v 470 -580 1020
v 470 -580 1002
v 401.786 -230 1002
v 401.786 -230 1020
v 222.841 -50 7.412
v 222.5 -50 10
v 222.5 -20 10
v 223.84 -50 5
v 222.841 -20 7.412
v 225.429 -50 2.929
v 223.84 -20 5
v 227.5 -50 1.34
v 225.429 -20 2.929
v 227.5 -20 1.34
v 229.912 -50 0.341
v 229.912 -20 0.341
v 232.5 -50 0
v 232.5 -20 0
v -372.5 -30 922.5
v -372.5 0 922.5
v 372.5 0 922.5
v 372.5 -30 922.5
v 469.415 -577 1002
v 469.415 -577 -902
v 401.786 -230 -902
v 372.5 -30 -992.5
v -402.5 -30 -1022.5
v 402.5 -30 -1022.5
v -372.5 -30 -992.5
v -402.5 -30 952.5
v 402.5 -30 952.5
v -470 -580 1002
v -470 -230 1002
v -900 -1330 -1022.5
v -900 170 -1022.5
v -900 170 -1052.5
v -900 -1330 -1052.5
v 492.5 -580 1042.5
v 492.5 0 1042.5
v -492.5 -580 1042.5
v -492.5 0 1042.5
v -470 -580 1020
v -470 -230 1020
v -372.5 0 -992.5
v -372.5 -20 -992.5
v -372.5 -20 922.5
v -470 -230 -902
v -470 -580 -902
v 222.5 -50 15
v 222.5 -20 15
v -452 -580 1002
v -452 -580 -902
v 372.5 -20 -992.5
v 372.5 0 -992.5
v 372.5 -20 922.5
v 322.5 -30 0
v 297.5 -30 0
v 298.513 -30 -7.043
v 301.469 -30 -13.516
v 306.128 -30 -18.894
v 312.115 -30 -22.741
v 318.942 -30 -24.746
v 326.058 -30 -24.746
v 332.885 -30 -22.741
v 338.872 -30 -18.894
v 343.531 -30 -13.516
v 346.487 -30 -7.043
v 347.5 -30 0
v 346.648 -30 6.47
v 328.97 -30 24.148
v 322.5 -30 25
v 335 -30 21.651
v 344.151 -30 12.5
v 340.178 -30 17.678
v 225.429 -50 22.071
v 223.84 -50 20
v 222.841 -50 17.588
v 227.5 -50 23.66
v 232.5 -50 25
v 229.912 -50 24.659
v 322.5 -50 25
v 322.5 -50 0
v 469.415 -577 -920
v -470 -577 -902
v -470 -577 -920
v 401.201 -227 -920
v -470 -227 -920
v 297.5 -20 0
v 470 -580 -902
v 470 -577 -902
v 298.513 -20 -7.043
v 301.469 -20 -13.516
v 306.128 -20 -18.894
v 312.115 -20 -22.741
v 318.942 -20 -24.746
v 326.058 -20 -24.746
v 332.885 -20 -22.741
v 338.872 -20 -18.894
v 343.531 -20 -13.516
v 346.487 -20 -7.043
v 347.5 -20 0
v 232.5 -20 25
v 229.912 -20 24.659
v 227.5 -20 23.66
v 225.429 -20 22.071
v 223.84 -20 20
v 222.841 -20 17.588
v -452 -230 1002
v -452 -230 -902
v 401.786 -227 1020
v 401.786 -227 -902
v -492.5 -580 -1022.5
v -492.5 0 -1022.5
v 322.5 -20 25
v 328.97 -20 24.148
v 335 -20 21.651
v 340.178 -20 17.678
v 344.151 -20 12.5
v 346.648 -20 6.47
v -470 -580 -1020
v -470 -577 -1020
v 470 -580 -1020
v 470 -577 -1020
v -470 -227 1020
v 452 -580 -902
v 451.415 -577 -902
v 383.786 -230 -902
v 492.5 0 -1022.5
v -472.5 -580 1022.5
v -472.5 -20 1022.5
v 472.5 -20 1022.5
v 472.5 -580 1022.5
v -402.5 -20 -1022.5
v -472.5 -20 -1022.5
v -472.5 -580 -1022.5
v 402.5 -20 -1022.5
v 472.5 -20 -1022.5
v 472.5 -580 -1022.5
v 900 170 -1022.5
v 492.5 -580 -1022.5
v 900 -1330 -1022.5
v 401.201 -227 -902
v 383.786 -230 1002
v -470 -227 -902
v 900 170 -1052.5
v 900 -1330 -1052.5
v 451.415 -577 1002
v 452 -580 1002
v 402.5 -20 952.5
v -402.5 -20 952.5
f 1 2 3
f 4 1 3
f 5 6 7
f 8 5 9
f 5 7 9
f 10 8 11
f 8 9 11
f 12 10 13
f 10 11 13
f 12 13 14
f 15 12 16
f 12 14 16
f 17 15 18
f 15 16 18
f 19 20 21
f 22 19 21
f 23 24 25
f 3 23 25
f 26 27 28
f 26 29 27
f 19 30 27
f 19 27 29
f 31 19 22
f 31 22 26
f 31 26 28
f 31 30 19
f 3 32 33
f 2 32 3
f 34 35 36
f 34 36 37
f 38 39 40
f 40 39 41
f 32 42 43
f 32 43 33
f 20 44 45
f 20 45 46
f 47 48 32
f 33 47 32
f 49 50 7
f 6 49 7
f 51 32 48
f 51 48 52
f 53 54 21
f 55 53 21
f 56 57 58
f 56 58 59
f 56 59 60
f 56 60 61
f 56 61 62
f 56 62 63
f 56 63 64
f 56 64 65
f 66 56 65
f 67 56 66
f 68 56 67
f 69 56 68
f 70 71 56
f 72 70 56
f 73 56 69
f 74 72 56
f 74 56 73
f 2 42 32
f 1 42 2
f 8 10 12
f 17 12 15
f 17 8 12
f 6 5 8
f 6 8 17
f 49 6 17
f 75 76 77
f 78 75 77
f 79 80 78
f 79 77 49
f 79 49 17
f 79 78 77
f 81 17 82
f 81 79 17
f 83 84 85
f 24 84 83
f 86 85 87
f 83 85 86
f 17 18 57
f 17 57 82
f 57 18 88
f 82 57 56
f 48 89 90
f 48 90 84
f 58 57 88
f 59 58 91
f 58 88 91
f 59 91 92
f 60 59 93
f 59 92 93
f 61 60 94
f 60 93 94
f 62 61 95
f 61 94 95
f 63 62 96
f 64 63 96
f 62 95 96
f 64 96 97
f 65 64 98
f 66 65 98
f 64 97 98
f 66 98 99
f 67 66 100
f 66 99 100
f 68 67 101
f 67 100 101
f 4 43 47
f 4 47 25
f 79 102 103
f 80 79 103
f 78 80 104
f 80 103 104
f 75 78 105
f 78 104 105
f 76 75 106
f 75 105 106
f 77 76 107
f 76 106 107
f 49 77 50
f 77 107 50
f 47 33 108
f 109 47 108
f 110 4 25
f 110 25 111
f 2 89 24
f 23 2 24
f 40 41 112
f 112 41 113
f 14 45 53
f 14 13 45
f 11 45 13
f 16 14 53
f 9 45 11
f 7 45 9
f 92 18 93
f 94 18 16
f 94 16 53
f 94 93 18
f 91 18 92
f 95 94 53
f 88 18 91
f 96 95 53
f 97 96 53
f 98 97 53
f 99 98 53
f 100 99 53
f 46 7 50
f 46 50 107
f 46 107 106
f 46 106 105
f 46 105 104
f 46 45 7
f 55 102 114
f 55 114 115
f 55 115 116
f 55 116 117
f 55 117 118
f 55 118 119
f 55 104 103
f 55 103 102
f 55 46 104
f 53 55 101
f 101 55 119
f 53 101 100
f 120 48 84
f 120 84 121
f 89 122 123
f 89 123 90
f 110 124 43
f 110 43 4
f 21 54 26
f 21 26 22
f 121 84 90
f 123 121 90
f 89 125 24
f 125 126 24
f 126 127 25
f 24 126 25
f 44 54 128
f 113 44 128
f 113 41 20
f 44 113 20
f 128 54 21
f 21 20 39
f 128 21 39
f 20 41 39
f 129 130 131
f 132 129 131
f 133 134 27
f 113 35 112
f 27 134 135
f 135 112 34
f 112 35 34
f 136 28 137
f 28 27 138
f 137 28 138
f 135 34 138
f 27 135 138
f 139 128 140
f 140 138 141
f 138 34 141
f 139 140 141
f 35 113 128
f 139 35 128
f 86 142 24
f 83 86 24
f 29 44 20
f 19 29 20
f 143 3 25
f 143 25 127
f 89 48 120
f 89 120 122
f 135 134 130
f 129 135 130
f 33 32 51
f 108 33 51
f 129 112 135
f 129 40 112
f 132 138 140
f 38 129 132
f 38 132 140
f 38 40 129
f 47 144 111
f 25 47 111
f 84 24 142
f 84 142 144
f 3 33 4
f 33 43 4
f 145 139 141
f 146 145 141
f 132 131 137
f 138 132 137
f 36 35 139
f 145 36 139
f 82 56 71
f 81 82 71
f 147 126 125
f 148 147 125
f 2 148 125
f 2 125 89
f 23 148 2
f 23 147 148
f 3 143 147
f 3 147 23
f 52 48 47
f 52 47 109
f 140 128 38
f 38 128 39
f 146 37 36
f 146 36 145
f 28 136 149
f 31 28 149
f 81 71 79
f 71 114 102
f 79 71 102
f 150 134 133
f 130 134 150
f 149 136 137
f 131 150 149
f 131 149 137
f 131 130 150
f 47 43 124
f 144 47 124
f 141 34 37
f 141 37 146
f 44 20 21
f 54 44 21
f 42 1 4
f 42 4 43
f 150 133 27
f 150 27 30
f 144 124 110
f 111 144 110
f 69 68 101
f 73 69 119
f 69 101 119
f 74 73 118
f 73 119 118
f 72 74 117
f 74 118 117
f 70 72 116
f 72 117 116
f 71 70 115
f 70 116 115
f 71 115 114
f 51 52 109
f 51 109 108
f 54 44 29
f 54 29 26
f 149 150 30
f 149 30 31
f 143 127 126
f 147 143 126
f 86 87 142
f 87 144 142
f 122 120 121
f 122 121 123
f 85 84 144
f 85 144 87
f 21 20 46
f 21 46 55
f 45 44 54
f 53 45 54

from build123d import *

# Parameters (mm, degrees)
F1_DEPTH  = 580
F3_DEPTH  = 20
F2_W      = 745
F2_H      = 1915
F2_W_2    = 805
F2_H_2    = 1975
F4_DEPTH  = 30
F5_DEPTH  = 30
F6_DEPTH  = 50
F7_W      = 1800
F7_H      = 1500
F8_DEPTH  = 30
F9_W      = 18
F9_H      = 1904
F10_DEPTH = 350
F11_DEPTH = 350
F12_START = -3
F12_DEPTH = 350
F13_DEPTH = 3
F15_DEPTH = 1904
F17_DEPTH = 18
F19_DEPTH = 18
F20_W     = 871.785590257
F20_H     = 3
F21_DEPTH = 1922


with BuildPart() as f1:
    # F0 (on Front) → F1 (new body)
    with BuildSketch(Plane.XZ):
        Polygon((-492.5, -1022.5), (-472.5, -1022.5), (-472.5, 1022.5), (472.5, 1022.5), (472.5, -1022.5), (492.5, -1022.5), (492.5, 1042.5), (-492.5, 1042.5), align=None)
    extrude(amount=F1_DEPTH)

    # F2 (on Front) → F3 (join)
    with BuildSketch(Plane.XZ):
        Polygon((-402.5, -1022.5), (-402.5, 952.5), (402.5, 952.5), (402.5, -1022.5), (472.5, -1022.5), (472.5, 1022.5), (-472.5, 1022.5), (-472.5, -1022.5), align=None)
    extrude(amount=F3_DEPTH)

    # F2 (on Front) → F4 (join)
    with BuildSketch(Plane.XZ):
        with Locations((0, -35)):
            Rectangle(F2_W_2, F2_H_2)
        with Locations((0, -35)):
            Rectangle(F2_W, F2_H, mode=Mode.SUBTRACT)
    extrude(amount=F4_DEPTH)

    # F7 (on face) → F8 (join)
    with BuildSketch(Plane(origin=(0, 0, -1022.5), x_dir=(1, 0, 0), z_dir=(0, 0, -1))):
        with Locations((0, 580)):
            Rectangle(F7_W, F7_H)
    extrude(amount=F8_DEPTH)


with BuildPart() as f3:
    # F2 (on Front) → F3, piece 2 (new body)
    with BuildSketch(Plane.XZ):
        with Locations((0, -35)):
            Rectangle(F2_W, F2_H)
        with BuildLine():
            ThreePointArc((322.5, 25), (340.1776695297, 17.6776695297), (347.5, 0))
            ThreePointArc((347.5, 0), (322.5, -25), (297.5, 0))
            Line((297.5, 0), (232.5, 0))
            ThreePointArc((232.5, 0), (225.4289321881, 2.9289321881), (222.5, 10))
            Line((222.5, 10), (222.5, 15))
            ThreePointArc((222.5, 15), (225.4289321881, 22.0710678119), (232.5, 25))
            Line((232.5, 25), (322.5, 25))
        make_face(mode=Mode.SUBTRACT)
    extrude(amount=F3_DEPTH)

    # F2 (on Front) → F5 (join)
    with BuildSketch(Plane.XZ):
        with BuildLine():
            ThreePointArc((297.5, 0), (322.5, -25), (347.5, 0))
            ThreePointArc((347.5, 0), (340.1776695297, 17.6776695297), (322.5, 25))
            Line((322.5, 25), (322.5, 0))
            Line((322.5, 0), (297.5, 0))
        make_face()
    extrude(amount=F5_DEPTH)

    # F2 (on Front) → F6 (join)
    with BuildSketch(Plane.XZ):
        with BuildLine():
            ThreePointArc((297.5, 0), (304.8223304703, 17.6776695297), (322.5, 25))
            Line((322.5, 25), (232.5, 25))
            ThreePointArc((232.5, 25), (225.4289321881, 22.0710678119), (222.5, 15))
            Line((222.5, 15), (222.5, 10))
            ThreePointArc((222.5, 10), (225.4289321881, 2.9289321881), (232.5, 0))
            Line((232.5, 0), (297.5, 0))
        make_face()
        with BuildLine():
            Line((322.5, 0), (322.5, 25))
            ThreePointArc((322.5, 25), (304.8223304703, 17.6776695297), (297.5, 0))
            Line((297.5, 0), (322.5, 0))
        make_face()
    extrude(amount=F6_DEPTH)


with BuildPart() as f10:
    # F9 (on face) → F10 (new body)
    with BuildSketch(Plane.XZ.offset(580)):
        with Locations((-461, 50)):
            Rectangle(F9_W, F9_H)
    extrude(amount=-F10_DEPTH)


with BuildPart() as f11:
    # F9 (on face) → F11 (new body)
    with BuildSketch(Plane.XZ.offset(580)):
        Polygon((470, 1002), (470, 1020), (-470, 1020), (-470, 1002), (-452, 1002), (452, 1002), align=None)
    extrude(amount=-F11_DEPTH)

    # F18 (on face) → F19 (cut, through all)
    with BuildSketch(Plane(origin=(0, 0, 1002), x_dir=(1, 0, 0), z_dir=(0, 0, -1))):
        Polygon((470, 230), (470, 580), (401.785590257, 230), align=None)
    extrude(amount=-F19_DEPTH, mode=Mode.SUBTRACT)


with BuildPart() as f12:
    # F9 (on face) → F12 (new body)
    with BuildSketch(Plane.XZ.offset(580).offset(F12_START)):
        Polygon((470, -920), (470, -902), (452, -902), (-452, -902), (-470, -902), (-470, -920), (-452, -920), (452, -920), align=None)
    extrude(amount=-F12_DEPTH)

    # F16 (on face) → F17 (cut, through all)
    with BuildSketch(Plane.XY.offset(-902)):
        Polygon((470, -580), (470, -227), (401.2008953163, -227), align=None)
    extrude(amount=-F17_DEPTH, mode=Mode.SUBTRACT)


with BuildPart() as f13:
    # F9 (on face) → F13 (new body)
    with BuildSketch(Plane.XZ.offset(580)):
        Polygon((470, -920), (470, -902), (452, -902), (-452, -902), (-470, -902), (-470, -920), (-452, -920), (452, -920), align=None)
        Polygon((470, -1020), (470, -920), (452, -920), (-452, -920), (-470, -920), (-470, -1020), align=None)
    extrude(amount=-F13_DEPTH)


with BuildPart() as f15:
    # F14 (on face) → F15 (new body, through all)
    with BuildSketch(Plane.XY.offset(-902)):
        Polygon((452, -580), (470, -580), (469.4153050593, -577), (451.4153050593, -577), align=None)
        Polygon((469.4153050593, -577), (401.785590257, -230), (383.785590257, -230), (451.4153050593, -577), align=None)
    extrude(amount=F15_DEPTH)


with BuildPart() as f21:
    # F20 (on face) → F21 (new body, through all)
    with BuildSketch(Plane.XY.offset(-902)):
        with Locations((-34.1072048715, -228.5)):
            Rectangle(F20_W, F20_H)
    extrude(amount=F21_DEPTH)


solid = Compound([f1.part, f3.part, f10.part, f11.part, f12.part, f13.part, f15.part, f21.part])
